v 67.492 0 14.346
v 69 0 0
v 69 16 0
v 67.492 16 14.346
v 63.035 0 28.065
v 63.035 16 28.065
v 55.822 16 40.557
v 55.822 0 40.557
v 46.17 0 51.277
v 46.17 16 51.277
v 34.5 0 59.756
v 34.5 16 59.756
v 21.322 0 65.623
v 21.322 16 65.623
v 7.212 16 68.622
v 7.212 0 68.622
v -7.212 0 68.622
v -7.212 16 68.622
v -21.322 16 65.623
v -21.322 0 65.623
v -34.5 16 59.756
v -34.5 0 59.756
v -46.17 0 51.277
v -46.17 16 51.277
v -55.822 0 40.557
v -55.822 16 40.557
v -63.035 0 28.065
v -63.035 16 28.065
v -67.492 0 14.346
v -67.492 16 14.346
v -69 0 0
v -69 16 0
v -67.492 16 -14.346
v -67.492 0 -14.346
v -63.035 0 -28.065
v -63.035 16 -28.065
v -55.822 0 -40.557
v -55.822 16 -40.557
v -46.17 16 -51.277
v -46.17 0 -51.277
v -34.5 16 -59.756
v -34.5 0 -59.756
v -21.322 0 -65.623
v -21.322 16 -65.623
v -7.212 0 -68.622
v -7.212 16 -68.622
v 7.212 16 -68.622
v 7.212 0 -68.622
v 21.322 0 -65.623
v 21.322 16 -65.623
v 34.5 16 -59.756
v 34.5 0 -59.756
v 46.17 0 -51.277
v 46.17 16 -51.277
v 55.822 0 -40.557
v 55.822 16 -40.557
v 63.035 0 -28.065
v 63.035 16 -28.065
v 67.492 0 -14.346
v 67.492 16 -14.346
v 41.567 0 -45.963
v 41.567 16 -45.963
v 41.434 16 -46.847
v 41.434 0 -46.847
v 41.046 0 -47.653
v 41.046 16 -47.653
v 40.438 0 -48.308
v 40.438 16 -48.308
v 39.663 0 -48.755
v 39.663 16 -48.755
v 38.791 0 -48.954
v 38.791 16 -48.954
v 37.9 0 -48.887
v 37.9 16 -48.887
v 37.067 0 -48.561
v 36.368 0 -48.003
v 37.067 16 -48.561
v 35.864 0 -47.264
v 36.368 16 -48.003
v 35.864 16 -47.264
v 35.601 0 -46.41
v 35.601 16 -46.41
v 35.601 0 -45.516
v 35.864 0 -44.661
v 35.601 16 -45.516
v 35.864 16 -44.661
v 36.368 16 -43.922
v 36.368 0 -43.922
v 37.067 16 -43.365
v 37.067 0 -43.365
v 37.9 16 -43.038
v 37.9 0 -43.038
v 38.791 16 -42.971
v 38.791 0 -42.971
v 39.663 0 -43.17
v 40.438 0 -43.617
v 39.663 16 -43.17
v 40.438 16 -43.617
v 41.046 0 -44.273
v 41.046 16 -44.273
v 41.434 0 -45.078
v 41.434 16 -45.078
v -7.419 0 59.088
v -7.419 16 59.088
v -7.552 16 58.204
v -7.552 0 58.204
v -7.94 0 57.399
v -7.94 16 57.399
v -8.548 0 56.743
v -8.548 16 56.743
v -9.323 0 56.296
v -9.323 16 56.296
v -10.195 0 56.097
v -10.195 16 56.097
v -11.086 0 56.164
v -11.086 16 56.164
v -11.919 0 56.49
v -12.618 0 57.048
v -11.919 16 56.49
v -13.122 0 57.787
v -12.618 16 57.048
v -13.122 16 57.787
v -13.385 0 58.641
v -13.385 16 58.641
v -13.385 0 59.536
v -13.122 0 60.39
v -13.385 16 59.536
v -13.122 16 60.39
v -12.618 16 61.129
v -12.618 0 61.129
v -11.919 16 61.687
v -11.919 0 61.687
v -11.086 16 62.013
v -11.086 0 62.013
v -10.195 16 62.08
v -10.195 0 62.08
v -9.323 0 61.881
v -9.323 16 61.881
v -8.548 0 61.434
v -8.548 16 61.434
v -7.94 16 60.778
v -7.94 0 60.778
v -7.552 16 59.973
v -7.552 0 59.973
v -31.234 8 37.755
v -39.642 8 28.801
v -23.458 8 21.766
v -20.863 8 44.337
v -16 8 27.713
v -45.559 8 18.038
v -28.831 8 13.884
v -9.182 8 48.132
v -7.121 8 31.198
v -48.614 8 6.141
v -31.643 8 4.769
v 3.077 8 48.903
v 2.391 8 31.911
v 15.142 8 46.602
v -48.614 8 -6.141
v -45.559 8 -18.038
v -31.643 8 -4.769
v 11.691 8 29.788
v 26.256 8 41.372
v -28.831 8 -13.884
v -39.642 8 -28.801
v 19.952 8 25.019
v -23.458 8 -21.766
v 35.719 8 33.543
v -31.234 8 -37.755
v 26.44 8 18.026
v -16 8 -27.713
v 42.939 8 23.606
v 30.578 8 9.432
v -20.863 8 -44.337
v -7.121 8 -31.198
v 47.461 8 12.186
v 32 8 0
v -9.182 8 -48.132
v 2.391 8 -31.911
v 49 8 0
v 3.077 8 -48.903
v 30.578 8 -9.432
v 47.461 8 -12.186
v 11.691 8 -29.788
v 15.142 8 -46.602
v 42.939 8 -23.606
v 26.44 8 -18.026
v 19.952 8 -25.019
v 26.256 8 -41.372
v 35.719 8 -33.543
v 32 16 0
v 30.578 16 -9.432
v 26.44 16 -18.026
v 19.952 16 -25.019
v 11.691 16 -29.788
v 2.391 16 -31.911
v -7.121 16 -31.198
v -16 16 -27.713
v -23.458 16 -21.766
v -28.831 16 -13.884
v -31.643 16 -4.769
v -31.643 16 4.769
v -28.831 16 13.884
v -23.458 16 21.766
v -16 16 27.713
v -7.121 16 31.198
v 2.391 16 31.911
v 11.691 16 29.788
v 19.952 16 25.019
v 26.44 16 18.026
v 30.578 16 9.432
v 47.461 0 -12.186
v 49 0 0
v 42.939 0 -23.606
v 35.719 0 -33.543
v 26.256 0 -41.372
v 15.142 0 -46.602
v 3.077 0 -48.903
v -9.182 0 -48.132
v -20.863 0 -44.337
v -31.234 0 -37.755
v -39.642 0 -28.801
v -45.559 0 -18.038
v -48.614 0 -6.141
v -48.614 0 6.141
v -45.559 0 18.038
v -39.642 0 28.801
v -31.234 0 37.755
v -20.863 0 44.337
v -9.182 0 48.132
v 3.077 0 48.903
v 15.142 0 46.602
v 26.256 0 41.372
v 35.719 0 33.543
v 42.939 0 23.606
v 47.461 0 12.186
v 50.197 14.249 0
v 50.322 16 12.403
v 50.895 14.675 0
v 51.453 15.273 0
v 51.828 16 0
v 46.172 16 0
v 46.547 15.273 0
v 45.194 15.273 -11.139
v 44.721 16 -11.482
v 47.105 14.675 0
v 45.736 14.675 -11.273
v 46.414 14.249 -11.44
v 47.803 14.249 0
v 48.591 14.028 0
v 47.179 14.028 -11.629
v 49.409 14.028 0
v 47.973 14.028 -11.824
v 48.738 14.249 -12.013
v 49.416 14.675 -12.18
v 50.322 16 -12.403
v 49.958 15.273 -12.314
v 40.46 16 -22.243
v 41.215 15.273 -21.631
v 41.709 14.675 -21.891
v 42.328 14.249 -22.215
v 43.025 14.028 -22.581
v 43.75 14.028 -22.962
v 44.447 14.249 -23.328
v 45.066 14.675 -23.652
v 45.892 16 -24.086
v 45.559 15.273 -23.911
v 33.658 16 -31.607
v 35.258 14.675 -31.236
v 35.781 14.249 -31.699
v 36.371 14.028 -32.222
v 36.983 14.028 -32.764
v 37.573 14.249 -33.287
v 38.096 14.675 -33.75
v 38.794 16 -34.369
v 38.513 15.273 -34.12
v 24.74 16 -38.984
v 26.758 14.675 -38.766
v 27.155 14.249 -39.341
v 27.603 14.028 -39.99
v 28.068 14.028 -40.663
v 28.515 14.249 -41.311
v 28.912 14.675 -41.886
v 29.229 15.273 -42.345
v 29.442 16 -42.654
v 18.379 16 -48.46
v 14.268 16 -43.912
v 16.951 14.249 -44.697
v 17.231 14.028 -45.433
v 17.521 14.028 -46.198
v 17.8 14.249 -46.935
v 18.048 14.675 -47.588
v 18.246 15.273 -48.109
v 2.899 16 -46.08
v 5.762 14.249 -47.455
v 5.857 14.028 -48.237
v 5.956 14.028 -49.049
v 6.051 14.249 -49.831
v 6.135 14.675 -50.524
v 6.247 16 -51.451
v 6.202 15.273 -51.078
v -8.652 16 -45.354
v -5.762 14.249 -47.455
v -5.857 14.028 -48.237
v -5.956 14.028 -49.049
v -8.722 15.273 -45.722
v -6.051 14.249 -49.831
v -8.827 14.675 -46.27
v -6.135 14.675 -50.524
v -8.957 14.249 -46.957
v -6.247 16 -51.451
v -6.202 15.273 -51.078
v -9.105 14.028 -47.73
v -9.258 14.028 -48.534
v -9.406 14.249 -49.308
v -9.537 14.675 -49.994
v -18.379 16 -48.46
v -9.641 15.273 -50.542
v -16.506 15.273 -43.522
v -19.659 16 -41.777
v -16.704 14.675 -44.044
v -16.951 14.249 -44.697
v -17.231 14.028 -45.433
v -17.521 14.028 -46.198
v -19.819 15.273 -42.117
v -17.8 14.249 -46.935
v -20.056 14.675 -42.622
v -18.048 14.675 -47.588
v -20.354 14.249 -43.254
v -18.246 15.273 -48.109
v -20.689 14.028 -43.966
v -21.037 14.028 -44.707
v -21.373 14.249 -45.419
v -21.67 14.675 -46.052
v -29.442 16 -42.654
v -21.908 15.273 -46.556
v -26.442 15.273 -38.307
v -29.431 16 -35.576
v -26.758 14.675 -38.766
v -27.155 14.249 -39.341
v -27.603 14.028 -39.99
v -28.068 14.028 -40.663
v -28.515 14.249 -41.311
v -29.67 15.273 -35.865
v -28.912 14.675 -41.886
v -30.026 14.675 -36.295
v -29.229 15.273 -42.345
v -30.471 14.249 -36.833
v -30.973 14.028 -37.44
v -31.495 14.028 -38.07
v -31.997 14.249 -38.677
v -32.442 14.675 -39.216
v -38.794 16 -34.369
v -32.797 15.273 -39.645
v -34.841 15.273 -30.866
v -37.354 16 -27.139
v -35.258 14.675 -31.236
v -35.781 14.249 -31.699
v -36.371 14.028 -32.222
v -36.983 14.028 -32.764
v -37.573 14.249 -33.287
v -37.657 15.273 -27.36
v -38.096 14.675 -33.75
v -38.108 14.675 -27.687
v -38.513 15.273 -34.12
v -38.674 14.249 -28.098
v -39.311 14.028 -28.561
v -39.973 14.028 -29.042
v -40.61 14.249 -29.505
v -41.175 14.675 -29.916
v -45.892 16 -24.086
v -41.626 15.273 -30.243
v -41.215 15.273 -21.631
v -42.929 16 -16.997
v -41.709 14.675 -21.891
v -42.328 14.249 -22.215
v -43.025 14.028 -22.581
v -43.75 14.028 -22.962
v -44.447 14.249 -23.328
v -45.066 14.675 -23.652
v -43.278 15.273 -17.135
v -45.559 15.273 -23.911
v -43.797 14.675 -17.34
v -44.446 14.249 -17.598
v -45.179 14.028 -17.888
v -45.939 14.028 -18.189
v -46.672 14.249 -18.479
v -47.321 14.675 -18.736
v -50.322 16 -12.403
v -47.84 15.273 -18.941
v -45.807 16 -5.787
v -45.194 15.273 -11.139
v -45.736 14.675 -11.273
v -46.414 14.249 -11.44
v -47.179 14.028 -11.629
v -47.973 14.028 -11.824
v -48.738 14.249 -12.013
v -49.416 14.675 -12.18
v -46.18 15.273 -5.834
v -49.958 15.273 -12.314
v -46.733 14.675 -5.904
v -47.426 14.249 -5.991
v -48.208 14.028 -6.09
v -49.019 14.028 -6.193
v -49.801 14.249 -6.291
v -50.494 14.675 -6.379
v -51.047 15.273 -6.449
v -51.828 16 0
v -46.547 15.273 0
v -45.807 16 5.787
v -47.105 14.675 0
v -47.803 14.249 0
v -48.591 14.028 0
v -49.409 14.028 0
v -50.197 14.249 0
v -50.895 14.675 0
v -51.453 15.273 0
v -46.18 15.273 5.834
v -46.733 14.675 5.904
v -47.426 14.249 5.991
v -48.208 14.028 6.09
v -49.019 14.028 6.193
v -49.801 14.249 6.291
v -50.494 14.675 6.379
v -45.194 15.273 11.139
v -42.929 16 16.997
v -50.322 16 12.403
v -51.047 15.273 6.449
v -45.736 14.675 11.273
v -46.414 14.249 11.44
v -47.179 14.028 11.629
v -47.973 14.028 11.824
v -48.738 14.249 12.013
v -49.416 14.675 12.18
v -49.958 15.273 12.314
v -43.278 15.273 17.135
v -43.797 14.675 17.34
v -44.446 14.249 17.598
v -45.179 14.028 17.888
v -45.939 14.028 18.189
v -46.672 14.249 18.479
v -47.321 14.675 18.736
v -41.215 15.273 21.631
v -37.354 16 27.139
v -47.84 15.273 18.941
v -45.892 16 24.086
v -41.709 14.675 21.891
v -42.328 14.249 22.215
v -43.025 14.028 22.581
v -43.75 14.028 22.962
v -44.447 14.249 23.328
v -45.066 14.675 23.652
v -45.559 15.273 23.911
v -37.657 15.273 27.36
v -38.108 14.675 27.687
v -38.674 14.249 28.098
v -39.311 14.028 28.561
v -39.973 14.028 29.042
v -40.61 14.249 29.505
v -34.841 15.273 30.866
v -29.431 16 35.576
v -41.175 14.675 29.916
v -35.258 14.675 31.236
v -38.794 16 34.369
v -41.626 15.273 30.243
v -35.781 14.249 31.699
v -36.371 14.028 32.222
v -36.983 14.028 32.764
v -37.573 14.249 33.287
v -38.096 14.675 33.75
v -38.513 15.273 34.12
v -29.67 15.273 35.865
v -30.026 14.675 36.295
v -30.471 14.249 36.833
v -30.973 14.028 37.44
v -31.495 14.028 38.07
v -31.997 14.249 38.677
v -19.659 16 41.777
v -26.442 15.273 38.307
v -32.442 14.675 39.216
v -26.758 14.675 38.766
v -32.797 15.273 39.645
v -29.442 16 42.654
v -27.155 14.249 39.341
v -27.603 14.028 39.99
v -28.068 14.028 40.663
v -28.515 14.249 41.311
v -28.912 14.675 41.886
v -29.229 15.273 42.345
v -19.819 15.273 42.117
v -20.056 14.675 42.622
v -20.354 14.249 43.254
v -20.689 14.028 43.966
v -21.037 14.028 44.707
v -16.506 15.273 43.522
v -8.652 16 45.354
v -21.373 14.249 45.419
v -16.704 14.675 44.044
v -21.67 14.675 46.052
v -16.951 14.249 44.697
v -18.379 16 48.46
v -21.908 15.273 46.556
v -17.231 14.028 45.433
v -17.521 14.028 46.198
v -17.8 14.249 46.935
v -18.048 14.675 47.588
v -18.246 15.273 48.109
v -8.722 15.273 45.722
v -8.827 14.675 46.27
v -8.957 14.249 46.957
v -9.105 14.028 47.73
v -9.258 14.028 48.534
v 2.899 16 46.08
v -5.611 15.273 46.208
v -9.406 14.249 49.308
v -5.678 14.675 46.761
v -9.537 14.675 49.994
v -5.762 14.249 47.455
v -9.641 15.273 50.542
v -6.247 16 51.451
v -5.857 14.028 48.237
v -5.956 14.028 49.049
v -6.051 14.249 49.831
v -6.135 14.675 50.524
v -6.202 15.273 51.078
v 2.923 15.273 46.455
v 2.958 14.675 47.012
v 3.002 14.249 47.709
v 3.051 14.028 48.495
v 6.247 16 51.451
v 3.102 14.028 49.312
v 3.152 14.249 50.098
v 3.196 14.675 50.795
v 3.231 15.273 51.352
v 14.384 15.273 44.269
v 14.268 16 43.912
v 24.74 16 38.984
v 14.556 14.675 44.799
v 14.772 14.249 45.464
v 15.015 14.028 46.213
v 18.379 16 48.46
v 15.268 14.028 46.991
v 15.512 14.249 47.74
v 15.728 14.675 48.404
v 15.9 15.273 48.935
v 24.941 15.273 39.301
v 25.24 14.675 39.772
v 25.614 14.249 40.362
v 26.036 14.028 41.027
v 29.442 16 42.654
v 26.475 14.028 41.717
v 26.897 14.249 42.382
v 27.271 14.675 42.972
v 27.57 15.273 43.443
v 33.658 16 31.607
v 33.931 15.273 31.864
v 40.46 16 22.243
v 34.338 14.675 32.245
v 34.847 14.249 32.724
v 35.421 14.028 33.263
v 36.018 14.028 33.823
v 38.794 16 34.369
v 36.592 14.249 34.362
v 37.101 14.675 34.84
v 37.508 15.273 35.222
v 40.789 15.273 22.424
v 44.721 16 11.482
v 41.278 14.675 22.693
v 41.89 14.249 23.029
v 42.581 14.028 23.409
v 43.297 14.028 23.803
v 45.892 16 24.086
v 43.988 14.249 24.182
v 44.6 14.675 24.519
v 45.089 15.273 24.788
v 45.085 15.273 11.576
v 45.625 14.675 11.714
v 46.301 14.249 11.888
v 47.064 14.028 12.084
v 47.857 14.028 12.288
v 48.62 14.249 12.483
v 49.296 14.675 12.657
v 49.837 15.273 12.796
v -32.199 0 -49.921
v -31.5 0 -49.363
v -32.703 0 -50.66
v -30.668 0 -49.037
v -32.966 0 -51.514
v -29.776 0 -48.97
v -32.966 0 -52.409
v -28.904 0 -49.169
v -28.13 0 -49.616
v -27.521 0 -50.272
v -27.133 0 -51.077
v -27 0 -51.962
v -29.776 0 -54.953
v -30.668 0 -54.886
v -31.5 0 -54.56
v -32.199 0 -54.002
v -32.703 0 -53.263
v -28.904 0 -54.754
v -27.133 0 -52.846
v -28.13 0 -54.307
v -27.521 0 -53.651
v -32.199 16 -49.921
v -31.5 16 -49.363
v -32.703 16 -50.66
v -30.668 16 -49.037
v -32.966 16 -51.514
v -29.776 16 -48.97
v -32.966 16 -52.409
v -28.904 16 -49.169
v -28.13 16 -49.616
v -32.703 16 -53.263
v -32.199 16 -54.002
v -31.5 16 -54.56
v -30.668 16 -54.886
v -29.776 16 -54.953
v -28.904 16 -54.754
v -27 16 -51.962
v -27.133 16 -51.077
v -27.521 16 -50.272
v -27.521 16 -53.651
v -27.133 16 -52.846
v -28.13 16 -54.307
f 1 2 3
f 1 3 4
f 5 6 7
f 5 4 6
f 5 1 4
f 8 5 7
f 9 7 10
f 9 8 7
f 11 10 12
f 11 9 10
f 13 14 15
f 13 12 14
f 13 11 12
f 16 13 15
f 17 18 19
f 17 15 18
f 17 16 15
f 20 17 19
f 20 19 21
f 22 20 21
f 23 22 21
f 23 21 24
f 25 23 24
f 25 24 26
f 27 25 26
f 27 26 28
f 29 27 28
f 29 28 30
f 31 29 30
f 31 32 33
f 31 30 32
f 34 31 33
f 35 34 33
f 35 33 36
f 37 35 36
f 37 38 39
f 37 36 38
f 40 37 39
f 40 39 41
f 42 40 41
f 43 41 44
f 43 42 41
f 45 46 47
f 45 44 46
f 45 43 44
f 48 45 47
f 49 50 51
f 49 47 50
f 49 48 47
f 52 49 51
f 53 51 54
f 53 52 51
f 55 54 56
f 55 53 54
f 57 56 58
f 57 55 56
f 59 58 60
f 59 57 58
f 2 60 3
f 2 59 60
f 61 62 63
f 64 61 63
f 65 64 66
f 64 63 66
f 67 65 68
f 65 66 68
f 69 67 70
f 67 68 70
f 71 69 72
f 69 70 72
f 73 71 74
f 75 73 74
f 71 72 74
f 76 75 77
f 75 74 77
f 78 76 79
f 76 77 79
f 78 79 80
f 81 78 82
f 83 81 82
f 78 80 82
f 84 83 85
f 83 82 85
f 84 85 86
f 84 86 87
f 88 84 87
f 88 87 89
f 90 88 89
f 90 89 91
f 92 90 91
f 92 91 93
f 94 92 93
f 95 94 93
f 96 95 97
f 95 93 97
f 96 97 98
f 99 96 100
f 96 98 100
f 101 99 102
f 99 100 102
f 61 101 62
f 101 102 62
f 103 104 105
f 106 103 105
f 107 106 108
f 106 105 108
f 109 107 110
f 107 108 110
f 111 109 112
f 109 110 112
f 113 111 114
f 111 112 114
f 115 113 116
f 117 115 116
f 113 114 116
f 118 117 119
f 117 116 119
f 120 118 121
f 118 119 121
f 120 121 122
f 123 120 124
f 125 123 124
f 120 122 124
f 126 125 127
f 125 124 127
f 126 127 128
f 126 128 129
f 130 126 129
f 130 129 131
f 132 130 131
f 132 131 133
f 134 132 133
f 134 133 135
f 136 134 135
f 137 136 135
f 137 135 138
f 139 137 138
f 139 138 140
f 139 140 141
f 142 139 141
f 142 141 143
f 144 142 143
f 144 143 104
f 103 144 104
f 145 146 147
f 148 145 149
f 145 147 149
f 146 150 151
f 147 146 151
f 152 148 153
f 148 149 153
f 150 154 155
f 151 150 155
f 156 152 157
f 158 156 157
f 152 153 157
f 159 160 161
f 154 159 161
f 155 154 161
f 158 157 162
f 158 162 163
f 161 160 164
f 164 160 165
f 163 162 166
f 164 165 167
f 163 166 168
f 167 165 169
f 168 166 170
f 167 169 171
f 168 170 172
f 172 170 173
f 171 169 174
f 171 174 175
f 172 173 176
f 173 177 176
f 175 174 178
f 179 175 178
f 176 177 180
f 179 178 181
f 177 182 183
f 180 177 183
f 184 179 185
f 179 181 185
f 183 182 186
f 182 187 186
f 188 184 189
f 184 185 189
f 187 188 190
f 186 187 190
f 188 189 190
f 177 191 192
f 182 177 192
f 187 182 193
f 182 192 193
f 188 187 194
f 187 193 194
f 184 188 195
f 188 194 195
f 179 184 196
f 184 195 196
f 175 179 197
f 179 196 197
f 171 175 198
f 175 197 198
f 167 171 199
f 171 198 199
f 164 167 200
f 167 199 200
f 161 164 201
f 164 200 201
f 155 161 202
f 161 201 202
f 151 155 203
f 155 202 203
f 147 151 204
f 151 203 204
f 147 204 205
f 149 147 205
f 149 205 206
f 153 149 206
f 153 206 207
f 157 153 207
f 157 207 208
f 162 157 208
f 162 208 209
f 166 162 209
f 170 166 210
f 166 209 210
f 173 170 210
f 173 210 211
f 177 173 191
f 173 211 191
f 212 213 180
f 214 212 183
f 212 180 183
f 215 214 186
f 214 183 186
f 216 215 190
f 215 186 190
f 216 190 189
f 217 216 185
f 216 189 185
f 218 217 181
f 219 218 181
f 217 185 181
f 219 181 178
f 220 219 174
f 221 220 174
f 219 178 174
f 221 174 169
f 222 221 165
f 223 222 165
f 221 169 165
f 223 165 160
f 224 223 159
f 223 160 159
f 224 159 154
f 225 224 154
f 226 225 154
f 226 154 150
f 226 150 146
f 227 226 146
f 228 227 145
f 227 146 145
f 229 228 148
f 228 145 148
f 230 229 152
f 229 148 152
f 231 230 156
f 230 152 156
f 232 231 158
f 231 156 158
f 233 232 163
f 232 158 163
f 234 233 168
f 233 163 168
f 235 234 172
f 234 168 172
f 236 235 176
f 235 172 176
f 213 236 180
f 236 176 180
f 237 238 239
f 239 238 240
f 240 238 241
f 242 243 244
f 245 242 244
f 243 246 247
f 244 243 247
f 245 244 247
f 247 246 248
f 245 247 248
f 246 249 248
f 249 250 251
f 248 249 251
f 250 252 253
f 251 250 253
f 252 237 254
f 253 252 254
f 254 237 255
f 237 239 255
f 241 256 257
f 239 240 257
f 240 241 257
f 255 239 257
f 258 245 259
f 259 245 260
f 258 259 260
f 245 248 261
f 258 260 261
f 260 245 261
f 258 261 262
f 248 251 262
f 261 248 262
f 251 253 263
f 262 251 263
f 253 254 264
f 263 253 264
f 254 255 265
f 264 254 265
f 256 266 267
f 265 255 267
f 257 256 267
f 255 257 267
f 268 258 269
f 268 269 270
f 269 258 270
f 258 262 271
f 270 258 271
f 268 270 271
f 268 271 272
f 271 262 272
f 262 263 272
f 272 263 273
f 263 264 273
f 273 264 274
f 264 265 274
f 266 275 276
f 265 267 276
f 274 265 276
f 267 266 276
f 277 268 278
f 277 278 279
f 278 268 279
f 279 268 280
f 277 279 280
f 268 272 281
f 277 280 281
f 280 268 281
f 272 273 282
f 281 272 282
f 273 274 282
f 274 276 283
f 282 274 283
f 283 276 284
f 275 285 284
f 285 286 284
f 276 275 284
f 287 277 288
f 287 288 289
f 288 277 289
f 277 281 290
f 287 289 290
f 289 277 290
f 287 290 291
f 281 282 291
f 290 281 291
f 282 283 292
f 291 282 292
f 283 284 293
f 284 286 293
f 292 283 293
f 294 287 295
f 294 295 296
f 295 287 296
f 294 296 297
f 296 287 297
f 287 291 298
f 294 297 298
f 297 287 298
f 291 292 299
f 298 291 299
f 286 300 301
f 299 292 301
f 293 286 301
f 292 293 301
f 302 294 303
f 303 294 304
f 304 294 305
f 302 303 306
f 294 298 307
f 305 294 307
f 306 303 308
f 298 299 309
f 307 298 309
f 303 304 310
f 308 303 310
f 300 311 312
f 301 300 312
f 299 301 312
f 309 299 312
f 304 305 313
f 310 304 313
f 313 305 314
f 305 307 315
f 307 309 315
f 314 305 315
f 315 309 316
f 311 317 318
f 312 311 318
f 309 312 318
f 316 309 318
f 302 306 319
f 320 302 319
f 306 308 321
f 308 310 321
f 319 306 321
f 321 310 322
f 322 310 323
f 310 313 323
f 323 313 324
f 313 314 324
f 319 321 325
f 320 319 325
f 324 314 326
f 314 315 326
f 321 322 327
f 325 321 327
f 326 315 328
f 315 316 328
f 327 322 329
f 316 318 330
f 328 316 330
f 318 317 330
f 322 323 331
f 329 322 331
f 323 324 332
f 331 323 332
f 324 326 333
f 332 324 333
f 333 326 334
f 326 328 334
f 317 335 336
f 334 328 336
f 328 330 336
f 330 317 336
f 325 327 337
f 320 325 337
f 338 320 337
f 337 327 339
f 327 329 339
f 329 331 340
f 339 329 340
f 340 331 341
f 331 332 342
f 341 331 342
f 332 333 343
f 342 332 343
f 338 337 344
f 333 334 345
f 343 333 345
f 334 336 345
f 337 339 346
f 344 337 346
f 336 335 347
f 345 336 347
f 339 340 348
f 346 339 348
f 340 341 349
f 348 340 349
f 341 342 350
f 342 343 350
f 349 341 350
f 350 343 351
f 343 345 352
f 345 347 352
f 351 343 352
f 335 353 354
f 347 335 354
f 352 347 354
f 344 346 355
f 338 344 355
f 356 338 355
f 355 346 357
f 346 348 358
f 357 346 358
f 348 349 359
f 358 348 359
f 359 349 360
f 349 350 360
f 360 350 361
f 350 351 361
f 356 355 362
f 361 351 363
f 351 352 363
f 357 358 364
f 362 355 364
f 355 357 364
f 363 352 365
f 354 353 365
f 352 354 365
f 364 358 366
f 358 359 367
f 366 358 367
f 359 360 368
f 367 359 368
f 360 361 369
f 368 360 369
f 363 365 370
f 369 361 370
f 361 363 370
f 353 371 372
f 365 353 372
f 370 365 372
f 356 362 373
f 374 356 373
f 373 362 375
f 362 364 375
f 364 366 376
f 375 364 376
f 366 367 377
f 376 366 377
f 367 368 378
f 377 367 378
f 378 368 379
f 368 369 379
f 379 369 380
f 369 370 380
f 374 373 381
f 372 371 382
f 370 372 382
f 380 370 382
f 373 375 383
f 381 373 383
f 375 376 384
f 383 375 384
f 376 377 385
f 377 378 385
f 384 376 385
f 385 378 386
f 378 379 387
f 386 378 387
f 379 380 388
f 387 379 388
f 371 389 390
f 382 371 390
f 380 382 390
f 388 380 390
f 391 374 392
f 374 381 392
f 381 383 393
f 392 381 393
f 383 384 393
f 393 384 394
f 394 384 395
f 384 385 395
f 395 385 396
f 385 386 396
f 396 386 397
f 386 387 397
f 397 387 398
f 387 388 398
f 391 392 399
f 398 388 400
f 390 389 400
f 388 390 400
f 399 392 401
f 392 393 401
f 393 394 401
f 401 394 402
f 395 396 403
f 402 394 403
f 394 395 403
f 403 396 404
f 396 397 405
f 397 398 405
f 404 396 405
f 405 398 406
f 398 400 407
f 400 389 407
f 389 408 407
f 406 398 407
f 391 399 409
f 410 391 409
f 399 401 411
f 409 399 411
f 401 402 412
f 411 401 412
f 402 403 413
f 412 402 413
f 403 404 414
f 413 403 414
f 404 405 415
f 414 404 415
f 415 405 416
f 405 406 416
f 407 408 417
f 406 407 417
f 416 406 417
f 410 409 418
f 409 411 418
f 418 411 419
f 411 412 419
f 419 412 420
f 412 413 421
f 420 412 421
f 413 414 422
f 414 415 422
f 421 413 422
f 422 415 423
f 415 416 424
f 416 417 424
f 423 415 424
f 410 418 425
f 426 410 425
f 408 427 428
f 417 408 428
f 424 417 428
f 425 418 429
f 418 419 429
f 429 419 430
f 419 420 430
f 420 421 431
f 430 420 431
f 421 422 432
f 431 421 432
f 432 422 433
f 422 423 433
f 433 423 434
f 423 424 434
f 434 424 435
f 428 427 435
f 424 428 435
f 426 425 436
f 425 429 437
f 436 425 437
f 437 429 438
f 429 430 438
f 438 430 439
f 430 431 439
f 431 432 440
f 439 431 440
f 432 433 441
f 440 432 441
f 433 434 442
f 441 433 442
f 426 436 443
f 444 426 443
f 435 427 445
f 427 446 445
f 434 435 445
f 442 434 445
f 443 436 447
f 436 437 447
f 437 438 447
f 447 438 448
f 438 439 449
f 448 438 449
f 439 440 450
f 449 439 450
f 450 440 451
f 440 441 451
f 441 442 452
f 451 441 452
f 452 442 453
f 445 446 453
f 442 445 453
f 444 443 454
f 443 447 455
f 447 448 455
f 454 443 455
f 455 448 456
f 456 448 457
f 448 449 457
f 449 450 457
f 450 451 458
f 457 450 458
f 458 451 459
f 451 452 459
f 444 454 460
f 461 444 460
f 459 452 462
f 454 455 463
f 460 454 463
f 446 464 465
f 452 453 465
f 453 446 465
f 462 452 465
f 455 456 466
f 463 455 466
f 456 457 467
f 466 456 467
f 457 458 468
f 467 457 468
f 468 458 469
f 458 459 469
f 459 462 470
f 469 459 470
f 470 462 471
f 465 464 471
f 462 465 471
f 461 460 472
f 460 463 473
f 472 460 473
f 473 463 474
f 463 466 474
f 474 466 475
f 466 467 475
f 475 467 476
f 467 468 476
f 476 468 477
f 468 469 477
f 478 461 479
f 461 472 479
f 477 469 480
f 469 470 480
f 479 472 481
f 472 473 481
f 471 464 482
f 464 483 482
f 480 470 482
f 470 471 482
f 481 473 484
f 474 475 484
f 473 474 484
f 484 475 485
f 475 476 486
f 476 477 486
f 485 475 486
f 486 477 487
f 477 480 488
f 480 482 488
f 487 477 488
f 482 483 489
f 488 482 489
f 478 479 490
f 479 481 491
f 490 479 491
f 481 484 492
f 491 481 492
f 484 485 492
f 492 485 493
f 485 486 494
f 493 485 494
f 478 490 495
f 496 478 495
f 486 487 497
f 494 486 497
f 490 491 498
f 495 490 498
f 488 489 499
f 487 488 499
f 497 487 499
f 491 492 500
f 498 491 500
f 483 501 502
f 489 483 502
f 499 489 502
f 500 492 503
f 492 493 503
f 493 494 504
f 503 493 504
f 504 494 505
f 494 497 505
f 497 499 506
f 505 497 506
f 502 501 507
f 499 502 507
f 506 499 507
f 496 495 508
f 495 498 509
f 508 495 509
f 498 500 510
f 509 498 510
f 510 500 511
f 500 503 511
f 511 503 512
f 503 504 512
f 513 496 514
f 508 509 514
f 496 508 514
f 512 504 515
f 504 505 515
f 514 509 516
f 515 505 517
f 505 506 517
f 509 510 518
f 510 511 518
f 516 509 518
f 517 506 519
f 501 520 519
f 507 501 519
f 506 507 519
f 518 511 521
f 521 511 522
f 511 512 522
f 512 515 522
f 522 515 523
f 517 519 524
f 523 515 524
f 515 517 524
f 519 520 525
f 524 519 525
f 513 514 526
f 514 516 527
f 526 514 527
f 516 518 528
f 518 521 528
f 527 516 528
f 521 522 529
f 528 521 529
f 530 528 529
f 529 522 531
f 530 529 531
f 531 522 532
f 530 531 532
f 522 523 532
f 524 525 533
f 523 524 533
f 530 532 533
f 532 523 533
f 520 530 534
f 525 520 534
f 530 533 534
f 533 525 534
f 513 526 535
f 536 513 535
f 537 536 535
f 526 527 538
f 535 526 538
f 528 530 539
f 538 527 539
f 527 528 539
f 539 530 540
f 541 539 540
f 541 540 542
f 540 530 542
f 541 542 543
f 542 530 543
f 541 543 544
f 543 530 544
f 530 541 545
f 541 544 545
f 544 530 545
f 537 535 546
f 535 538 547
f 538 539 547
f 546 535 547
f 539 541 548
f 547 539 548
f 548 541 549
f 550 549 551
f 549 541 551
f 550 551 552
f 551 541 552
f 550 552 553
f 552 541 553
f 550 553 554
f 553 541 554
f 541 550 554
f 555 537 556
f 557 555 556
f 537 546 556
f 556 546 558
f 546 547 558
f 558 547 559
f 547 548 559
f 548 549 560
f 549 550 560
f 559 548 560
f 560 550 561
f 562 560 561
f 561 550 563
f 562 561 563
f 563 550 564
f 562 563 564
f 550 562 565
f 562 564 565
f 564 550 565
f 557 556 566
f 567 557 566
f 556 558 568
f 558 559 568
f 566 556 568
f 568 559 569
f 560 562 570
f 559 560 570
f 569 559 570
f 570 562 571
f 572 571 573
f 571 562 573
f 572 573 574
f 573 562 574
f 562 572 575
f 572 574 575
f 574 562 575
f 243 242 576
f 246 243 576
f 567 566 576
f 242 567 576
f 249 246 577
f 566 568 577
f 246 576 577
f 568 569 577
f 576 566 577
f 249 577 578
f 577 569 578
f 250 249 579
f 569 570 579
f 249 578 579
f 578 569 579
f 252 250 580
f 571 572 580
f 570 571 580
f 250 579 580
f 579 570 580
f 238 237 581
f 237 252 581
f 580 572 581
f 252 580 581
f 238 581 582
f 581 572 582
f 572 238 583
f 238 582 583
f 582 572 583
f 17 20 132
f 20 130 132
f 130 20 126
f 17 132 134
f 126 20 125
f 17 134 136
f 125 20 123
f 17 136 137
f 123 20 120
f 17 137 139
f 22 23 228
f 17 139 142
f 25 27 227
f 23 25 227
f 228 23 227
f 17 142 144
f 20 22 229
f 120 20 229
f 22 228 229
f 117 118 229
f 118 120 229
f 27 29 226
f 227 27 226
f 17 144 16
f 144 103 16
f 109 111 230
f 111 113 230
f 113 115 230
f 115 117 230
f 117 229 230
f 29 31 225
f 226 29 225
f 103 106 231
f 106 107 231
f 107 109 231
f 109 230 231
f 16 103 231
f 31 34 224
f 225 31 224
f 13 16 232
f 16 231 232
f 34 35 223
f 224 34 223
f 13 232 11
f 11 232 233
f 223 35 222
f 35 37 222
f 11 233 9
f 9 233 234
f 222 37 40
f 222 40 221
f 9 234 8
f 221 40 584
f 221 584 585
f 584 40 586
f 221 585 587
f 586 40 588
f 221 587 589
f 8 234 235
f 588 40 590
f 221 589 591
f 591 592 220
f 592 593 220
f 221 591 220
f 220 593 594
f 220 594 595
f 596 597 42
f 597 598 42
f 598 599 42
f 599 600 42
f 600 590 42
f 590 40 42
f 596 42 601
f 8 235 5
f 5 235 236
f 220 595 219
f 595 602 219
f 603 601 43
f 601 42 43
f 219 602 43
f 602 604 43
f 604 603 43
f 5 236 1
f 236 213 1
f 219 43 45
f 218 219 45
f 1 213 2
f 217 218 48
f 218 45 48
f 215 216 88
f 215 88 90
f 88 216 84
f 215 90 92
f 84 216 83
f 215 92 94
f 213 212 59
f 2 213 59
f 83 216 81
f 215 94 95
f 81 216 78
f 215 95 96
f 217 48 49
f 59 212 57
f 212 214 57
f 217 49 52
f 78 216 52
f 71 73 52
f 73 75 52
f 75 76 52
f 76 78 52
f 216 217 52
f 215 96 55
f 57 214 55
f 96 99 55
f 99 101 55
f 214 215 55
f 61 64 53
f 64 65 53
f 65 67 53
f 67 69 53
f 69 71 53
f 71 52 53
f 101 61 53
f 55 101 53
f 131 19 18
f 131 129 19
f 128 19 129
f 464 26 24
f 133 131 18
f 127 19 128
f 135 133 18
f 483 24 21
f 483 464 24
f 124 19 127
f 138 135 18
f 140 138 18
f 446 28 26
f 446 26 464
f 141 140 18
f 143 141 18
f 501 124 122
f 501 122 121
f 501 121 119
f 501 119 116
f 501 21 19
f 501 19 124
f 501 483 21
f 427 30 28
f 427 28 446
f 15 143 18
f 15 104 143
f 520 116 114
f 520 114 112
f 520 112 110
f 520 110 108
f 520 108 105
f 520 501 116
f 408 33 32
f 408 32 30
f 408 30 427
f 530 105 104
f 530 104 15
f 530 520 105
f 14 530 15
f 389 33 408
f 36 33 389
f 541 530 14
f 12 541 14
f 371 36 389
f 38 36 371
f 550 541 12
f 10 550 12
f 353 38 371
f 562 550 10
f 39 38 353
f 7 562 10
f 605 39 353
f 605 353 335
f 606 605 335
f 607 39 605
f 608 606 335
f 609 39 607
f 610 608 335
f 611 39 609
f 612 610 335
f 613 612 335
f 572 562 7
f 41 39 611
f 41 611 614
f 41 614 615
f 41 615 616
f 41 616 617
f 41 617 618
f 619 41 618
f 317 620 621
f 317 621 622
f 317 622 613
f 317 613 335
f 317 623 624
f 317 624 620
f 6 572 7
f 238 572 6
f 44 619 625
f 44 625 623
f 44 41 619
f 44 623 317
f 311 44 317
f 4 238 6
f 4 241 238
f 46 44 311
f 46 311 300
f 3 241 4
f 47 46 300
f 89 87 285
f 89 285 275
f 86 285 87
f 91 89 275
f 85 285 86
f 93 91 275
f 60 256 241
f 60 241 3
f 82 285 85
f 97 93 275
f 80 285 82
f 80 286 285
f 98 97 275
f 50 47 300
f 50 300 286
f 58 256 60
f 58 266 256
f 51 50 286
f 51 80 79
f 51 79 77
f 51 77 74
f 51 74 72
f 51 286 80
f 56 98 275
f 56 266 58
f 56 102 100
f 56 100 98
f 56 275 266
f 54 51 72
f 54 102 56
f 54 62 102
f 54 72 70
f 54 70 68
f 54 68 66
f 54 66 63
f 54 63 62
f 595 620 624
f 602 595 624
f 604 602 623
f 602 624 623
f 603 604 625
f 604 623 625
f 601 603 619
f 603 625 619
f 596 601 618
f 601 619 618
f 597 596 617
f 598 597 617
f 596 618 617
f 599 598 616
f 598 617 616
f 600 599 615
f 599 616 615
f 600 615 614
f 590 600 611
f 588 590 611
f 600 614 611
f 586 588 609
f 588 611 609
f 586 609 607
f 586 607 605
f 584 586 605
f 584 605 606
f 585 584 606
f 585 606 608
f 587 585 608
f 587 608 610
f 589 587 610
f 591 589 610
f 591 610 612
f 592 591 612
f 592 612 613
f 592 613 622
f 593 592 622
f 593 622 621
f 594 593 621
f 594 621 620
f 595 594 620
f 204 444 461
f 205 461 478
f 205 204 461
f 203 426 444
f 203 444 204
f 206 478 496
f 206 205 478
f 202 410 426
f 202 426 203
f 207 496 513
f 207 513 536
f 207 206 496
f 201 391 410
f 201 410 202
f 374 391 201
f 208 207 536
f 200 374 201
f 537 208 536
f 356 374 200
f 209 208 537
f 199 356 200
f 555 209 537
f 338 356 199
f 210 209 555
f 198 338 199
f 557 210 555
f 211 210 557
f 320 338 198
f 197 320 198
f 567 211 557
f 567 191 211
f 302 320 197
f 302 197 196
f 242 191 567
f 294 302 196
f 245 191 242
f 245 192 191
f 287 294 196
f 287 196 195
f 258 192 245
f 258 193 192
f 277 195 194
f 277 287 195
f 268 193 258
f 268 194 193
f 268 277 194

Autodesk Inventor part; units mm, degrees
ref_plane "YZ Plane" through (0, 0, 0) normal (1, 0, 0) x (0, 1, 0)
ref_plane "XZ Plane" through (0, 0, 0) normal (0, 1, 0) x (-1, 0, 0)
ref_plane "XY Plane" through (0, 0, 0) normal (0, 0, 1) x (1, 0, 0)
sketch "Эскиз1" plane through (0, 0, 0) normal (0, 0, 1) x (1, 0, 0)
  line L0 (0, 0) -> (0, 8)
  line L1 (0, 8) -> (0, 16)
  line L2 (0, 16) -> (69, 16)
  line L3 (69, 16) -> (69, 0)
  line L4 (69, 0) -> (49, 0)
  line L5 (49, 0) -> (49, 8)
  line L6 (49, 8) -> (32, 8)
  line L7 (32, 8) -> (32, 16)
  line L8 (0, 16) -> (49, 16)
  line L9 (49, 16) -> (49, 17)
  circle A0 centre (49, 17) radius 3
  point P0 (51.8284, 16)
  point P1 (46.1716, 16)
  dimension "d0" = 8
  dimension "d1" = 8
  dimension "d2" = 69
  dimension "d3" = 20
  dimension "d4" = 17
  dimension "d6" = 32
  dimension "d7" = 49
  dimension "d8" = 49
  dimension "d9" = 1
  dimension "d10" = 6
revolve "Вращение1" add sketch "Эскиз1" angle 360 about axis through (0, 8, 0) along (0, 1, 0) contours L2 A0 L3 L4 L5 L6 L7
sketch "Эскиз2" plane through (0, 16, 0) normal (0, 1, 0) x (1, 0, 0)
  line L0 (0, 0) -> (38.5673, 45.9627)
  line L1 (0, 0) -> (60, 0) construction
  line L2 (0, 0) -> (-30, 51.9615)
  line L3 (0, 0) -> (60, 0) construction
  line L4 (0, 0) -> (-10.4189, -59.0885)
  line L5 (0, 0) -> (60, 0) construction
  circle A0 centre (-30, 51.9615) radius 3
  circle A1 centre (38.5673, 45.9627) radius 3
  circle A2 centre (-10.4189, -59.0885) radius 3
  dimension "d11" = 60
  dimension "d12" = 50
  dimension "d13" = 60
  dimension "d14" = 120
  dimension "d15" = 60
  dimension "d16" = 100
  dimension "d17" = 6
  dimension "d18" = 6
  dimension "d19" = 6
extrude "Выдавливание1" cut sketch "Эскиз2" against normal through all
properties part number "Корпус дросселя_CPY" material "Чугун, серый"
